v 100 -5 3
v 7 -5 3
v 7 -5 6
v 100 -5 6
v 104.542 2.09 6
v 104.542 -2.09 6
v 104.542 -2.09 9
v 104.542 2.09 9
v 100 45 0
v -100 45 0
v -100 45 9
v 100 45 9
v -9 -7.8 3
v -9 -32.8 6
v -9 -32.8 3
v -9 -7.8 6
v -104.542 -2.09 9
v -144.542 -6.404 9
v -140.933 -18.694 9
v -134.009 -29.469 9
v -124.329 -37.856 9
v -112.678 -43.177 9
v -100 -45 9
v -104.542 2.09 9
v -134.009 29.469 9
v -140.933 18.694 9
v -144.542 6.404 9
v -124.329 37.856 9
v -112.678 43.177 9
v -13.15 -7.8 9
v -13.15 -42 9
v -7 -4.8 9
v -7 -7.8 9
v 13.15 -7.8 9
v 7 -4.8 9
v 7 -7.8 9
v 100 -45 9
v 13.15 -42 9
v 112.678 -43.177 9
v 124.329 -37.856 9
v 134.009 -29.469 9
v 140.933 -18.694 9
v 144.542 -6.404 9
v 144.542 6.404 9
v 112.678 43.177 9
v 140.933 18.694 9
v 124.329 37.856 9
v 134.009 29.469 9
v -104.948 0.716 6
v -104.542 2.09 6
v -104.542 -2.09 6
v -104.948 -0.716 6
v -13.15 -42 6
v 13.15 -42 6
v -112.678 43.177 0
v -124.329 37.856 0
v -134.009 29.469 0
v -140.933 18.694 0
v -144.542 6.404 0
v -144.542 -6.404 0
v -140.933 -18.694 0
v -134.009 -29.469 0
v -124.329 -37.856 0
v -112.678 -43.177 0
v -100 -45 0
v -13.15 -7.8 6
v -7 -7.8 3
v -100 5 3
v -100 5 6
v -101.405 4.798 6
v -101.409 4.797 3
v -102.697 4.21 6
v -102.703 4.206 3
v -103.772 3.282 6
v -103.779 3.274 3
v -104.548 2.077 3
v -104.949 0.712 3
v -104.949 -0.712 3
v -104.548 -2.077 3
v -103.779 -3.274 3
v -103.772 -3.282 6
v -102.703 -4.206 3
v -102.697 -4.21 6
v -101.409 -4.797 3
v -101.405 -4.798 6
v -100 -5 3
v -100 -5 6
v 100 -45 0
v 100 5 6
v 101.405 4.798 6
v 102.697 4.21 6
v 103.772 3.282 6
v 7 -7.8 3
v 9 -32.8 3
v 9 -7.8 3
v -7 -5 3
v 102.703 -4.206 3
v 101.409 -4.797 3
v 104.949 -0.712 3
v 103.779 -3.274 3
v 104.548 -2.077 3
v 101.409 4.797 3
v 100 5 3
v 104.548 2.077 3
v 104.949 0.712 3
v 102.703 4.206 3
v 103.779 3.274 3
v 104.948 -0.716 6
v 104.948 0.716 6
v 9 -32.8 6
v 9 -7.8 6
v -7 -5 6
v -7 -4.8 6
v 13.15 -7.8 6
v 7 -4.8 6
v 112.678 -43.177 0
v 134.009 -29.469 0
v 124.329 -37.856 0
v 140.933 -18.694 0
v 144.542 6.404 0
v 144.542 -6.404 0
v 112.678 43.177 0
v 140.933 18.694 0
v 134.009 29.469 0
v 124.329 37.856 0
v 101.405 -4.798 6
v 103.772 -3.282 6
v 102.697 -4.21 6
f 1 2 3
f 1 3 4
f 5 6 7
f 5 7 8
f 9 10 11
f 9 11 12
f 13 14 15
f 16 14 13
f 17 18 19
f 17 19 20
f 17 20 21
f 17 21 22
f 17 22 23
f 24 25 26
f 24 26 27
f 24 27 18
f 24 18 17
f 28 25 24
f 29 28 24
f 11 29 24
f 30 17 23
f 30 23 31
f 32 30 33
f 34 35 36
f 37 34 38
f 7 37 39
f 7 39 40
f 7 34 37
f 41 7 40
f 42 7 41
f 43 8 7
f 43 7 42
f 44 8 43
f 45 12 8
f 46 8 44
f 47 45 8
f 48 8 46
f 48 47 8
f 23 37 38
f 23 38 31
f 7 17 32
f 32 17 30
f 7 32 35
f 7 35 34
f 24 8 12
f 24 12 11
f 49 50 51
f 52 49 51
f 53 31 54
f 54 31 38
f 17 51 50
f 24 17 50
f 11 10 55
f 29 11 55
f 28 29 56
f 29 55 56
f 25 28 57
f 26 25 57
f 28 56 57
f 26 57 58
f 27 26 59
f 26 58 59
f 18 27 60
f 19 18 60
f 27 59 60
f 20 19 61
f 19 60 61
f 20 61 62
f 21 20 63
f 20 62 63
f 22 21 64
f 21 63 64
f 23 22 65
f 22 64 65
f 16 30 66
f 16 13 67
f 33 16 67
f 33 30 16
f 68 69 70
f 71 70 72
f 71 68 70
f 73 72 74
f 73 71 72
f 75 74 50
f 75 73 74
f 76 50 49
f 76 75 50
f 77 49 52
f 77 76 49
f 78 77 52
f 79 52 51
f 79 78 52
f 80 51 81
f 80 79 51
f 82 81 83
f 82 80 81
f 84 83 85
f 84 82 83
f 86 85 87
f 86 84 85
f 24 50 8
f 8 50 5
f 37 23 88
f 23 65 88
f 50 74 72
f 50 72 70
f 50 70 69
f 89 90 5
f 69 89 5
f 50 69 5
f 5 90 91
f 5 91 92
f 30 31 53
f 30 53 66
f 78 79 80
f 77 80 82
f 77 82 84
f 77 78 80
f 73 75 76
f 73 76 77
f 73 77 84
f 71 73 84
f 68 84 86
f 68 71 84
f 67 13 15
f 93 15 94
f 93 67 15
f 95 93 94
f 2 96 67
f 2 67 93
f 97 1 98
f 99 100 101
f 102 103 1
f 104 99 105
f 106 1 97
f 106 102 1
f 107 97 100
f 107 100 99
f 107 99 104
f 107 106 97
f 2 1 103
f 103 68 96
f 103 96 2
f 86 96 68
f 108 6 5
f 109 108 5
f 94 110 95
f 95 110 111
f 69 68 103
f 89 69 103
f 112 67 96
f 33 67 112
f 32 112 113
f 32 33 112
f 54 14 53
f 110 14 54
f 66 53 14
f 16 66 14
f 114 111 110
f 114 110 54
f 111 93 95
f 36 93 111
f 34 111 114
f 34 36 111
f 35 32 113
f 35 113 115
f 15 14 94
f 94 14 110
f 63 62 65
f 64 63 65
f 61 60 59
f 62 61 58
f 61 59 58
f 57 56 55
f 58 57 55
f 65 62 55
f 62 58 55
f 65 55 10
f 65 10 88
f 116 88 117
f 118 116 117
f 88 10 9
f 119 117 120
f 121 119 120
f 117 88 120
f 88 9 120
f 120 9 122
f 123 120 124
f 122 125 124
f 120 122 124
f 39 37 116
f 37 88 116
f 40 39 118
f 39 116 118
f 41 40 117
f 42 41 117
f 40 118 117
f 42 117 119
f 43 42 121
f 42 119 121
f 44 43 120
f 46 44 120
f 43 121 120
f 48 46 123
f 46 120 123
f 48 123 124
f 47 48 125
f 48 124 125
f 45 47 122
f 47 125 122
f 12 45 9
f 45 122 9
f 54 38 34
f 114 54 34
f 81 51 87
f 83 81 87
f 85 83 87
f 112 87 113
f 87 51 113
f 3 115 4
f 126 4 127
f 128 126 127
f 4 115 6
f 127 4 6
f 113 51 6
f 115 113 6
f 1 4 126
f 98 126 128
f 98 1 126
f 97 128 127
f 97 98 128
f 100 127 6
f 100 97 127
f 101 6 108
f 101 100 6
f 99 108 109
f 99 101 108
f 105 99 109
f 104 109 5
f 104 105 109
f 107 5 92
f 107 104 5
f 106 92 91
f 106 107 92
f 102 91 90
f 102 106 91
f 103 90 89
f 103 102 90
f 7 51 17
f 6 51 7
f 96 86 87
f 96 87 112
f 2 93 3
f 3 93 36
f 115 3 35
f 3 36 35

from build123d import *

# Parameters (mm, degrees)
PAD_DEPTH       = 3
PAD001_DEPTH    = 3
SKETCH002_W     = 209.08447
SKETCH002_H     = 4.18
PAD002_DEPTH    = 3
SKETCH003_W     = 26.3
SKETCH003_H     = 34.2
POCKET_DEPTH    = 3
SKETCH004_W     = 18
SKETCH004_H     = 25
POCKET001_DEPTH = 3
SKETCH005_W     = 14
SKETCH005_H     = 3
POCKET002_DEPTH = 6


with BuildPart() as part:
    # Sketch → Pad (new body)
    with BuildSketch(Plane.XY):
        with BuildLine():
            ThreePointArc((-100, 45), (-145, 0), (-100, -45))
            Line((-100, -45), (100, -45))
            ThreePointArc((100, -45), (145, 0), (100, 45))
            Line((-100, 45), (100, 45))
        make_face()
    extrude(amount=PAD_DEPTH)

    # Sketch001 (on Face6 of Pad) → Pad001 (join)
    with BuildSketch(Plane.XY.offset(3)):
        with BuildLine():
            ThreePointArc((-100, 45), (-145, 0), (-100, -45))
            Line((-100, -45), (100, -45))
            ThreePointArc((100, -45), (145, 0), (100, 45))
            Line((-100, 45), (100, 45))
        make_face()
        with BuildLine():
            ThreePointArc((-100, 5), (-105, 0), (-100, -5))
            Line((-100, -5), (100, -5))
            ThreePointArc((100, -5), (105, 0), (100, 5))
            Line((-100, 5), (100, 5))
        make_face(mode=Mode.SUBTRACT)
    extrude(amount=PAD001_DEPTH)

    # Sketch002 (on Face9 of Pad001) → Pad002 (join)
    with BuildSketch(Plane.XY.offset(6)):
        with BuildLine():
            ThreePointArc((-100, 45), (-145, 0), (-100, -45))
            Line((-100, -45), (100, -45))
            ThreePointArc((100, -45), (145, 0), (100, 45))
            Line((-100, 45), (100, 45))
        make_face()
        Rectangle(SKETCH002_W, SKETCH002_H, mode=Mode.SUBTRACT)
    extrude(amount=PAD002_DEPTH)

    # Sketch003 (on Face13 of Pad002) → Pocket (cut)
    with BuildSketch(Plane.XY.offset(9)):
        with Locations((0, -24.9)):
            Rectangle(SKETCH003_W, SKETCH003_H)
    extrude(amount=-POCKET_DEPTH, mode=Mode.SUBTRACT)

    # Sketch004 (on Face27 of Pocket) → Pocket001 (cut)
    with BuildSketch(Plane.XY.offset(6)):
        with Locations((0, -20.3)):
            Rectangle(SKETCH004_W, SKETCH004_H)
    extrude(amount=-POCKET001_DEPTH, mode=Mode.SUBTRACT)

    # Sketch005 (on Face13 of Pocket001) → Pocket002 (cut)
    with BuildSketch(Plane.XY.offset(9)):
        with Locations((0, -6.3)):
            Rectangle(SKETCH005_W, SKETCH005_H)
    extrude(amount=-POCKET002_DEPTH, mode=Mode.SUBTRACT)


solid = part.part
